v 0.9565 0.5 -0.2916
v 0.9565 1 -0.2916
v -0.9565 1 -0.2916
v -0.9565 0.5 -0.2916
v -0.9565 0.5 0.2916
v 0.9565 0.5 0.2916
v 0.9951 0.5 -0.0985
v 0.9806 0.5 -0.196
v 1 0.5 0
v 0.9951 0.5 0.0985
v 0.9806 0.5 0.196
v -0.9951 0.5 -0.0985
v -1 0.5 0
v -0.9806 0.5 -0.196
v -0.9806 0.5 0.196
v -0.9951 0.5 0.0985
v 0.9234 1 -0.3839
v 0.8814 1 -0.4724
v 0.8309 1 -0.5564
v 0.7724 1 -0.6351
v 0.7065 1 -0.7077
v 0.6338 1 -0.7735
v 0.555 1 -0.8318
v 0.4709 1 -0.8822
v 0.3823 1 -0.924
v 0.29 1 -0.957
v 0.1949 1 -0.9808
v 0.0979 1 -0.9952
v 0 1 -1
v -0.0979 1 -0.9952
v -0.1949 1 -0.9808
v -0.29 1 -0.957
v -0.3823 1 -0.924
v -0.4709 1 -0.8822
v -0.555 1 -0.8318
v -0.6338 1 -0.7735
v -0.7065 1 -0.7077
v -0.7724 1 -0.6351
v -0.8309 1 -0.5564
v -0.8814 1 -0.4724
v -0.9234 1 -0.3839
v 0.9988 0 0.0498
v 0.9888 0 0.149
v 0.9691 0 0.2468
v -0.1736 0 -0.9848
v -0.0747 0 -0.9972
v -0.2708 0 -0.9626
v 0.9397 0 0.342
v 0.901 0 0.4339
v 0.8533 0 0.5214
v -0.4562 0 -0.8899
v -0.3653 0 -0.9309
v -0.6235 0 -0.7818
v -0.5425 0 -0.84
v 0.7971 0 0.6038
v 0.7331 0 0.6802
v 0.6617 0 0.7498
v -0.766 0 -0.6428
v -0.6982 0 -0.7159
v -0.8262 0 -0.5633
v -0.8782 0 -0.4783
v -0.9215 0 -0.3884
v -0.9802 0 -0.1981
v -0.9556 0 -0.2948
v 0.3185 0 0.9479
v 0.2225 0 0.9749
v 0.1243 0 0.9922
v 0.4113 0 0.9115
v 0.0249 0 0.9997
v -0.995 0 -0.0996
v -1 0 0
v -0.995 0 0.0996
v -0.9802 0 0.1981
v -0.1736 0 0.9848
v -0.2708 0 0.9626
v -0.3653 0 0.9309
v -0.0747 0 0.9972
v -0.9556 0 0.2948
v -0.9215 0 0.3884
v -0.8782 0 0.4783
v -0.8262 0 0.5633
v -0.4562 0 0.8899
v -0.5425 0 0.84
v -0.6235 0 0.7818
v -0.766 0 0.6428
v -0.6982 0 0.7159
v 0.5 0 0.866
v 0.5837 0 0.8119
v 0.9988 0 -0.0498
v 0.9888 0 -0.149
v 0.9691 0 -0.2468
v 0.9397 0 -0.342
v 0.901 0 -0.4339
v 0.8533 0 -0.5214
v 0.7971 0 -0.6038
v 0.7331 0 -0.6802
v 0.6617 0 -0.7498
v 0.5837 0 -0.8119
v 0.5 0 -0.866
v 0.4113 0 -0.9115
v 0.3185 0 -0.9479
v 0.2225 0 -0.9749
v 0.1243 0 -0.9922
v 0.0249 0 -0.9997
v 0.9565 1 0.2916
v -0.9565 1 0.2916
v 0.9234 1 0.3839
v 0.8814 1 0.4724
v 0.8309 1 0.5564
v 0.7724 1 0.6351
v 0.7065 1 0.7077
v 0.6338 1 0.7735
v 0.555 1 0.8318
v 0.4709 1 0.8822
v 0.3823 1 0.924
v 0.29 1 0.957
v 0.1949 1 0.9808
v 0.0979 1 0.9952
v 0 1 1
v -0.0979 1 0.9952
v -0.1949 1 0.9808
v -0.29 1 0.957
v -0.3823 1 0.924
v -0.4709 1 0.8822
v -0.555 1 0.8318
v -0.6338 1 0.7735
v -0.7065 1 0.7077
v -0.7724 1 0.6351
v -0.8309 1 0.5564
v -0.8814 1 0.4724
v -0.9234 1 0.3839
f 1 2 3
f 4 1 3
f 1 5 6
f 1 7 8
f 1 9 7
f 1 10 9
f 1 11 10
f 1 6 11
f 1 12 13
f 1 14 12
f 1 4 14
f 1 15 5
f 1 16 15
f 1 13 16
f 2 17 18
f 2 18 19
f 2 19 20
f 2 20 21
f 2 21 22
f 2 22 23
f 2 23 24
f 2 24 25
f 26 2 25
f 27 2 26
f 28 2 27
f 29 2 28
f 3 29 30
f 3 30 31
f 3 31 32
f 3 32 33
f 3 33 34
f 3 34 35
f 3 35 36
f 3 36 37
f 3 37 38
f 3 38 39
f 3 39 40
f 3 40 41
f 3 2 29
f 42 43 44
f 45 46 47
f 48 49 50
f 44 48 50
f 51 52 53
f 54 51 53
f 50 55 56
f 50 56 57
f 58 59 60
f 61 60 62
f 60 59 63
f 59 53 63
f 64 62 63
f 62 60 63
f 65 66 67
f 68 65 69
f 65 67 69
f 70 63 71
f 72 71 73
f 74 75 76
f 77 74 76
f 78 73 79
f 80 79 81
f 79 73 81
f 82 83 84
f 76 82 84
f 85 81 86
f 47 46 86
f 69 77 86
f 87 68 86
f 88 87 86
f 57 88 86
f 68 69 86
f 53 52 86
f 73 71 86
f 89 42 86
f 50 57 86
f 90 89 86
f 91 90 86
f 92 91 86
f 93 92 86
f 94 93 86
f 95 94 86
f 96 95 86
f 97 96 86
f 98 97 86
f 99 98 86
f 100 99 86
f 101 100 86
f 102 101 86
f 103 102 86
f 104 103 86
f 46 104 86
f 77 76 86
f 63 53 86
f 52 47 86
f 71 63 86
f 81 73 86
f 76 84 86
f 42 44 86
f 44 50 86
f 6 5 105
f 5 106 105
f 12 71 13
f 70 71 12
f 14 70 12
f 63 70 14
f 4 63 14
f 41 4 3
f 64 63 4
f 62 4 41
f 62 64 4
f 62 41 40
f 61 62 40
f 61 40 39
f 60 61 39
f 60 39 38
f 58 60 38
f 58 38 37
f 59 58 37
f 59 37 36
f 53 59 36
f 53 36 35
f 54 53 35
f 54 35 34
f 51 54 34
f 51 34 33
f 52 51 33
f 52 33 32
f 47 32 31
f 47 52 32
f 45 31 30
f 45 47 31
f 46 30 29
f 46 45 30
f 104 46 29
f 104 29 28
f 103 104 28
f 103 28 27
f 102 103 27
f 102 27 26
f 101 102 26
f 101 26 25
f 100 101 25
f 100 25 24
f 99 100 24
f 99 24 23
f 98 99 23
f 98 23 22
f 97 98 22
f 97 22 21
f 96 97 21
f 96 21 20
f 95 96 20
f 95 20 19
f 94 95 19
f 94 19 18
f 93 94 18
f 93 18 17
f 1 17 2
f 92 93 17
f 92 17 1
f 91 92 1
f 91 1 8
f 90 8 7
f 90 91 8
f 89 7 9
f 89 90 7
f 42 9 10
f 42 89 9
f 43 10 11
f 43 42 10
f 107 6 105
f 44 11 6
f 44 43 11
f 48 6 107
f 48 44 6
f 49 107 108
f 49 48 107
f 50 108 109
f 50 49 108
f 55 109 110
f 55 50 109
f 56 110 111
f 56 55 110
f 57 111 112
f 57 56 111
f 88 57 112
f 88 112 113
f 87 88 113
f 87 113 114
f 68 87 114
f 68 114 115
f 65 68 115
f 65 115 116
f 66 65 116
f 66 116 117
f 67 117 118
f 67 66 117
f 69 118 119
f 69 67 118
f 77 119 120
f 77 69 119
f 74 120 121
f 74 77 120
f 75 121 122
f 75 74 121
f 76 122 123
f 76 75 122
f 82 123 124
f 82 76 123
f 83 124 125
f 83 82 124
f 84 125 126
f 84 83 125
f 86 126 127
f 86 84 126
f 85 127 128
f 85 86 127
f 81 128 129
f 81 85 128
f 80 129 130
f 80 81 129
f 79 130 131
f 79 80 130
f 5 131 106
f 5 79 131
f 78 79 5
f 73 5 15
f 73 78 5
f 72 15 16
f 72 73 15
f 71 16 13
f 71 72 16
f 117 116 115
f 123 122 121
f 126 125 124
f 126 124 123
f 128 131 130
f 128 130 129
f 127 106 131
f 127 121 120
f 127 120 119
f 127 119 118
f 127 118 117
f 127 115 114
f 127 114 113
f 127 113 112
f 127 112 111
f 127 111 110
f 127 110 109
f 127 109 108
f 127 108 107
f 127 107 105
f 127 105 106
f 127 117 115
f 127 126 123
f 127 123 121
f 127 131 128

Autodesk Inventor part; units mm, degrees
ref_plane "YZ Plane" through (0, 0, 0) normal (1, 0, 0) x (0, 1, 0)
ref_plane "XZ Plane" through (0, 0, 0) normal (0, 1, 0) x (-1, 0, 0)
ref_plane "XY Plane" through (0, 0, 0) normal (0, 0, 1) x (1, 0, 0)
sketch "Sketch1" plane through (0, 0, 0) normal (0, 1, 0) x (-1, 0, 0)
  circle A0 centre (0, 0) radius 1
  dimension "d0" = 2
extrude "Extrusion1" add sketch "Sketch1" along normal blind 1
sketch "Sketch2" plane through (0, 1, 0) normal (0, 1, 0) x (1, 0, 0)
  line L0 (-1, -0.2916) -> (1, -0.2916)
  line L1 (1, -0.2916) -> (1, 0.2916)
  line L2 (1, 0.2916) -> (-1, 0.2916)
  line L3 (-1, 0.2916) -> (-1, -0.2916)
  line L4 (-1, -0.2916) -> (1, 0.2916) construction
  line L5 (1, -0.2916) -> (-1, 0.2916) construction
  point P0 (0, 0)
extrude "Extrusion2" cut sketch "Sketch2" against normal blind 0.5
properties part number "screw" material "Steel, High Strength, Low Alloy"
